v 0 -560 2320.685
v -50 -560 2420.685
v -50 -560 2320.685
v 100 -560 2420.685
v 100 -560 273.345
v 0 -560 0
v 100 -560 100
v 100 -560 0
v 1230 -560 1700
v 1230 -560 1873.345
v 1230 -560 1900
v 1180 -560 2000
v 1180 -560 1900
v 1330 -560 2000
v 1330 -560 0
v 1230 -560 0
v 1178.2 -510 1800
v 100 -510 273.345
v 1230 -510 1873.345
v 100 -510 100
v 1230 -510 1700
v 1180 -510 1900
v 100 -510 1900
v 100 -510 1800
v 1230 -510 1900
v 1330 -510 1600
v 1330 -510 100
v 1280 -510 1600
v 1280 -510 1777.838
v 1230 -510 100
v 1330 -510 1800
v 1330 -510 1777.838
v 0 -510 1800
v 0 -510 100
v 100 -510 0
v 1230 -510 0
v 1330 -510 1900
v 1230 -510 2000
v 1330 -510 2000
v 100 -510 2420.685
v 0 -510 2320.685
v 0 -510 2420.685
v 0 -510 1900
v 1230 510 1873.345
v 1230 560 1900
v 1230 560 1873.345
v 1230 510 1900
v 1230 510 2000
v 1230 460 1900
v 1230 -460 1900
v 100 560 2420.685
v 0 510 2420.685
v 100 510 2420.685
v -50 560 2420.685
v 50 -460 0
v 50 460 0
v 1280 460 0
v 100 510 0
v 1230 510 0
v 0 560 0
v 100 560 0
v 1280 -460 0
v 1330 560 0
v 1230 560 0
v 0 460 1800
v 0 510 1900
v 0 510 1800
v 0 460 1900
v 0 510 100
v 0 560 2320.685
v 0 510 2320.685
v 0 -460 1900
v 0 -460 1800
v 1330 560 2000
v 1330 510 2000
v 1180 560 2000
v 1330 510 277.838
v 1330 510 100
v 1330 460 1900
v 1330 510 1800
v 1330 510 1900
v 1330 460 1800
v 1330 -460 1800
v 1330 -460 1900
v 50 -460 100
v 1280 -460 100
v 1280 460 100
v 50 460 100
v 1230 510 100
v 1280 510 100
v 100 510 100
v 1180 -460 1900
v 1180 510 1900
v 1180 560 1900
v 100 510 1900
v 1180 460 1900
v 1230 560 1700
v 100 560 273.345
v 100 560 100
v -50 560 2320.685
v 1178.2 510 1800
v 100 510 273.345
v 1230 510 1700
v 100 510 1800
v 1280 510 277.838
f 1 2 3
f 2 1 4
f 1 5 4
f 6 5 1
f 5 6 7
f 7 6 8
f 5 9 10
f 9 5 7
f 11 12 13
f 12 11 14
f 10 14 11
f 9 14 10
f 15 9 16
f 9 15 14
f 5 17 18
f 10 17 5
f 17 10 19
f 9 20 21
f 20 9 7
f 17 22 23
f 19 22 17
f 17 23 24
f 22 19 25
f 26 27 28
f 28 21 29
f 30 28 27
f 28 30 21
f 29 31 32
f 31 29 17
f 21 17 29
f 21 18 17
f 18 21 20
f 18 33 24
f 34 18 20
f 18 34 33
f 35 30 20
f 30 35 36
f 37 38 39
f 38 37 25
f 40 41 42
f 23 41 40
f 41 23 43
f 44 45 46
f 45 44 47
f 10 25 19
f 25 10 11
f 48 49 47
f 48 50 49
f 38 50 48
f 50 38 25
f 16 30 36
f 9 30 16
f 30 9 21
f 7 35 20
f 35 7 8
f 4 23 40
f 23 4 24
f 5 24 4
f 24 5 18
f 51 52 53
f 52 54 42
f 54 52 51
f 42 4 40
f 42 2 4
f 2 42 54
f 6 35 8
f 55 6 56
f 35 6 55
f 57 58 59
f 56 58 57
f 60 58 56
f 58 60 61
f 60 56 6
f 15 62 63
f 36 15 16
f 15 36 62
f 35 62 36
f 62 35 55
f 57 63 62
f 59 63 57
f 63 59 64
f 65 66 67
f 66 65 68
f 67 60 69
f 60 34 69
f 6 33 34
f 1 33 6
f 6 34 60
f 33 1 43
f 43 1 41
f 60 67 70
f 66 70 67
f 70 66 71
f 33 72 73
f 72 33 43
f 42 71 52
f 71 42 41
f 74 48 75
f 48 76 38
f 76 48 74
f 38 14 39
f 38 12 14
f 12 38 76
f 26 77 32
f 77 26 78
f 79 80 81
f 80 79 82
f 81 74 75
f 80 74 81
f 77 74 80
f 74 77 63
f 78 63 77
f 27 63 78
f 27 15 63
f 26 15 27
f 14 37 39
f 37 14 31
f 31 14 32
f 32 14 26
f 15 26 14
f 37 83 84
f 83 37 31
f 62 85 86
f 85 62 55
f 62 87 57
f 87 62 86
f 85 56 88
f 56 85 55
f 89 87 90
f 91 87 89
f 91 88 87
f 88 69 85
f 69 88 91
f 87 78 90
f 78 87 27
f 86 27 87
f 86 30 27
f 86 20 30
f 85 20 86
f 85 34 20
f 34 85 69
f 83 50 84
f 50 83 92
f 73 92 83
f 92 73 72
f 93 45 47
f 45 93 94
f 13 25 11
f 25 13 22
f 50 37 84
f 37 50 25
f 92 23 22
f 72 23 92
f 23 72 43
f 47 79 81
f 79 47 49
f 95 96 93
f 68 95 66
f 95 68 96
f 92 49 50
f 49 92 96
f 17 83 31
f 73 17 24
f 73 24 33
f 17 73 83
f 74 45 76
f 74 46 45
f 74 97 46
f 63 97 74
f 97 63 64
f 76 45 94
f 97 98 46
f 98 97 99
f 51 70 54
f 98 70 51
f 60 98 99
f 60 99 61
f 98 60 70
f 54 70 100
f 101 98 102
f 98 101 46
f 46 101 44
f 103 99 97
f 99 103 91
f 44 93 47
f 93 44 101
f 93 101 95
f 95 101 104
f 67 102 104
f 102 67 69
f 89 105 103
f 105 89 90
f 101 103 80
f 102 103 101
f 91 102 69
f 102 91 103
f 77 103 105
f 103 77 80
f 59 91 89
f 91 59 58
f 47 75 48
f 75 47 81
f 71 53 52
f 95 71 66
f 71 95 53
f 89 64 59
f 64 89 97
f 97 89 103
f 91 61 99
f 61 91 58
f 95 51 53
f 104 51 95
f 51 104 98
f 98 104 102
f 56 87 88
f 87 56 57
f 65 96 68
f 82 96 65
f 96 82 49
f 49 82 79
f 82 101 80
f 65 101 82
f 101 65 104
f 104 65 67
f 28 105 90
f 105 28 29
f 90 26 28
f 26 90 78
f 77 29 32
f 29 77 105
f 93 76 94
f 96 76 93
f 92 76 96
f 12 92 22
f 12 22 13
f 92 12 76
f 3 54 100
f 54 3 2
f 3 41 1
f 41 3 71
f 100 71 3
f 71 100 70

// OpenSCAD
// Copyright 2026 Heikki Suonsivu
// Licensed under Creative Commons CC-BY-NC-SA, see https://creativecommons.org/licenses/by-nc-sa/4.0/
// For commercial licensing, please contact directly, hsu-3d@suonsivu.net, +358 40 551 9679

// TODO: katto
// TODO: make model parts for testing
// TODO: screwhole and end cut templates
// TODO: side covering strips

include <hsu.scad>

tolpat44=0;

kattokulma=20;
vajatakah=2000;
vajaw=1020;
vajal=1230;
vajakattoextend=300;
vajaetuh=vajatakah+sin(kattokulma)*vajal;

nelonen=100;
kakkonen=50;

sivutukiangle=atan((vajal-nelonen)/(vajatakah-nelonen*4));
takatukiangle=atan((vajaw)/(vajatakah-nelonen*5));

vajaoutw=tolpat44?nelonen+vajaw+nelonen:kakkonen+vajaw+kakkonen;

module kakkosnelonen(l) {
  echo(str("kakkosnelonen(",l,")"));
  cube([kakkonen,nelonen,l]);
}

module neljanelonen(l) {
  echo(str("neljanelonen(",l,")"));
  cube([nelonen,nelonen,l]);
}

module rima(l) {
  cube([kakkonen,kakkonen,l]);
}

module sivuvinotuki() {
  render() color("blue") intersection() {
    translate([nelonen,-vajaoutw/2,nelonen]) rotate([0,sivutukiangle,0]) rotate([0,0,90]) kakkosnelonen((vajatakah-nelonen*4)/cos(sivutukiangle)+nelonen/tan(sivutukiangle));
    translate([nelonen,-vajaoutw/2,nelonen]) cube([vajal-nelonen,vajaoutw,vajatakah-nelonen]);
  }
}

module takavinotuki() {
  x=vajal+(tolpat44?nelonen:kakkonen);
  render() color("blue") intersection() {
    translate([x,vajaw/2,nelonen]) rotate([takatukiangle,0,0]) rotate([0,0,0]) kakkosnelonen((vajatakah-nelonen*5)/cos(takatukiangle)+nelonen/tan(takatukiangle));
    translate([x,-vajaw/2,nelonen]) cube([kakkonen,vajaw,vajatakah-nelonen]);
  }
}

module halkovaja() {
  for (m=[0,1]) mirror([0,m,0]) {
      // Front verticals
      translate([0,-vajaw/2-(tolpat44?nelonen:0),0]) if (tolpat44) neljanelonen(vajaetuh); else rotate([0,0,-90]) kakkosnelonen(vajaetuh);
      // Back verticals
      translate([vajal,-vajaw/2-(tolpat44?nelonen:0),0]) if (tolpat44) neljanelonen(vajatakah); else rotate([0,0,-90]) kakkosnelonen(vajatakah);
      // Side bottom
      color("red") translate([kakkonen,-vajaw/2,0]) rotate([90,0,90]) kakkosnelonen(vajal);
      // Top bottom
      color("red") translate([0,-vajaw/2,vajatakah-nelonen*2]) rotate([90,0,90]) kakkosnelonen(vajal+nelonen);
      // Vinotuet
      sivuvinotuki();
    }
  takavinotuki();
  color("green") translate([0,-vajaw/2,nelonen]) rotate([-90,0,0]) kakkosnelonen(vajaw);
  color("green") translate([vajal+kakkonen,-vajaw/2,nelonen]) rotate([-90,0,0]) kakkosnelonen(vajaw);
  color("green") translate([vajal-kakkonen,-vajaoutw/2,vajatakah]) rotate([-90,0,0]) kakkosnelonen(vajaoutw);
  color("green") translate([-kakkonen,-vajaoutw/2,vajaetuh]) rotate([-90,0,0]) kakkosnelonen(vajaoutw);
}

halkovaja();
